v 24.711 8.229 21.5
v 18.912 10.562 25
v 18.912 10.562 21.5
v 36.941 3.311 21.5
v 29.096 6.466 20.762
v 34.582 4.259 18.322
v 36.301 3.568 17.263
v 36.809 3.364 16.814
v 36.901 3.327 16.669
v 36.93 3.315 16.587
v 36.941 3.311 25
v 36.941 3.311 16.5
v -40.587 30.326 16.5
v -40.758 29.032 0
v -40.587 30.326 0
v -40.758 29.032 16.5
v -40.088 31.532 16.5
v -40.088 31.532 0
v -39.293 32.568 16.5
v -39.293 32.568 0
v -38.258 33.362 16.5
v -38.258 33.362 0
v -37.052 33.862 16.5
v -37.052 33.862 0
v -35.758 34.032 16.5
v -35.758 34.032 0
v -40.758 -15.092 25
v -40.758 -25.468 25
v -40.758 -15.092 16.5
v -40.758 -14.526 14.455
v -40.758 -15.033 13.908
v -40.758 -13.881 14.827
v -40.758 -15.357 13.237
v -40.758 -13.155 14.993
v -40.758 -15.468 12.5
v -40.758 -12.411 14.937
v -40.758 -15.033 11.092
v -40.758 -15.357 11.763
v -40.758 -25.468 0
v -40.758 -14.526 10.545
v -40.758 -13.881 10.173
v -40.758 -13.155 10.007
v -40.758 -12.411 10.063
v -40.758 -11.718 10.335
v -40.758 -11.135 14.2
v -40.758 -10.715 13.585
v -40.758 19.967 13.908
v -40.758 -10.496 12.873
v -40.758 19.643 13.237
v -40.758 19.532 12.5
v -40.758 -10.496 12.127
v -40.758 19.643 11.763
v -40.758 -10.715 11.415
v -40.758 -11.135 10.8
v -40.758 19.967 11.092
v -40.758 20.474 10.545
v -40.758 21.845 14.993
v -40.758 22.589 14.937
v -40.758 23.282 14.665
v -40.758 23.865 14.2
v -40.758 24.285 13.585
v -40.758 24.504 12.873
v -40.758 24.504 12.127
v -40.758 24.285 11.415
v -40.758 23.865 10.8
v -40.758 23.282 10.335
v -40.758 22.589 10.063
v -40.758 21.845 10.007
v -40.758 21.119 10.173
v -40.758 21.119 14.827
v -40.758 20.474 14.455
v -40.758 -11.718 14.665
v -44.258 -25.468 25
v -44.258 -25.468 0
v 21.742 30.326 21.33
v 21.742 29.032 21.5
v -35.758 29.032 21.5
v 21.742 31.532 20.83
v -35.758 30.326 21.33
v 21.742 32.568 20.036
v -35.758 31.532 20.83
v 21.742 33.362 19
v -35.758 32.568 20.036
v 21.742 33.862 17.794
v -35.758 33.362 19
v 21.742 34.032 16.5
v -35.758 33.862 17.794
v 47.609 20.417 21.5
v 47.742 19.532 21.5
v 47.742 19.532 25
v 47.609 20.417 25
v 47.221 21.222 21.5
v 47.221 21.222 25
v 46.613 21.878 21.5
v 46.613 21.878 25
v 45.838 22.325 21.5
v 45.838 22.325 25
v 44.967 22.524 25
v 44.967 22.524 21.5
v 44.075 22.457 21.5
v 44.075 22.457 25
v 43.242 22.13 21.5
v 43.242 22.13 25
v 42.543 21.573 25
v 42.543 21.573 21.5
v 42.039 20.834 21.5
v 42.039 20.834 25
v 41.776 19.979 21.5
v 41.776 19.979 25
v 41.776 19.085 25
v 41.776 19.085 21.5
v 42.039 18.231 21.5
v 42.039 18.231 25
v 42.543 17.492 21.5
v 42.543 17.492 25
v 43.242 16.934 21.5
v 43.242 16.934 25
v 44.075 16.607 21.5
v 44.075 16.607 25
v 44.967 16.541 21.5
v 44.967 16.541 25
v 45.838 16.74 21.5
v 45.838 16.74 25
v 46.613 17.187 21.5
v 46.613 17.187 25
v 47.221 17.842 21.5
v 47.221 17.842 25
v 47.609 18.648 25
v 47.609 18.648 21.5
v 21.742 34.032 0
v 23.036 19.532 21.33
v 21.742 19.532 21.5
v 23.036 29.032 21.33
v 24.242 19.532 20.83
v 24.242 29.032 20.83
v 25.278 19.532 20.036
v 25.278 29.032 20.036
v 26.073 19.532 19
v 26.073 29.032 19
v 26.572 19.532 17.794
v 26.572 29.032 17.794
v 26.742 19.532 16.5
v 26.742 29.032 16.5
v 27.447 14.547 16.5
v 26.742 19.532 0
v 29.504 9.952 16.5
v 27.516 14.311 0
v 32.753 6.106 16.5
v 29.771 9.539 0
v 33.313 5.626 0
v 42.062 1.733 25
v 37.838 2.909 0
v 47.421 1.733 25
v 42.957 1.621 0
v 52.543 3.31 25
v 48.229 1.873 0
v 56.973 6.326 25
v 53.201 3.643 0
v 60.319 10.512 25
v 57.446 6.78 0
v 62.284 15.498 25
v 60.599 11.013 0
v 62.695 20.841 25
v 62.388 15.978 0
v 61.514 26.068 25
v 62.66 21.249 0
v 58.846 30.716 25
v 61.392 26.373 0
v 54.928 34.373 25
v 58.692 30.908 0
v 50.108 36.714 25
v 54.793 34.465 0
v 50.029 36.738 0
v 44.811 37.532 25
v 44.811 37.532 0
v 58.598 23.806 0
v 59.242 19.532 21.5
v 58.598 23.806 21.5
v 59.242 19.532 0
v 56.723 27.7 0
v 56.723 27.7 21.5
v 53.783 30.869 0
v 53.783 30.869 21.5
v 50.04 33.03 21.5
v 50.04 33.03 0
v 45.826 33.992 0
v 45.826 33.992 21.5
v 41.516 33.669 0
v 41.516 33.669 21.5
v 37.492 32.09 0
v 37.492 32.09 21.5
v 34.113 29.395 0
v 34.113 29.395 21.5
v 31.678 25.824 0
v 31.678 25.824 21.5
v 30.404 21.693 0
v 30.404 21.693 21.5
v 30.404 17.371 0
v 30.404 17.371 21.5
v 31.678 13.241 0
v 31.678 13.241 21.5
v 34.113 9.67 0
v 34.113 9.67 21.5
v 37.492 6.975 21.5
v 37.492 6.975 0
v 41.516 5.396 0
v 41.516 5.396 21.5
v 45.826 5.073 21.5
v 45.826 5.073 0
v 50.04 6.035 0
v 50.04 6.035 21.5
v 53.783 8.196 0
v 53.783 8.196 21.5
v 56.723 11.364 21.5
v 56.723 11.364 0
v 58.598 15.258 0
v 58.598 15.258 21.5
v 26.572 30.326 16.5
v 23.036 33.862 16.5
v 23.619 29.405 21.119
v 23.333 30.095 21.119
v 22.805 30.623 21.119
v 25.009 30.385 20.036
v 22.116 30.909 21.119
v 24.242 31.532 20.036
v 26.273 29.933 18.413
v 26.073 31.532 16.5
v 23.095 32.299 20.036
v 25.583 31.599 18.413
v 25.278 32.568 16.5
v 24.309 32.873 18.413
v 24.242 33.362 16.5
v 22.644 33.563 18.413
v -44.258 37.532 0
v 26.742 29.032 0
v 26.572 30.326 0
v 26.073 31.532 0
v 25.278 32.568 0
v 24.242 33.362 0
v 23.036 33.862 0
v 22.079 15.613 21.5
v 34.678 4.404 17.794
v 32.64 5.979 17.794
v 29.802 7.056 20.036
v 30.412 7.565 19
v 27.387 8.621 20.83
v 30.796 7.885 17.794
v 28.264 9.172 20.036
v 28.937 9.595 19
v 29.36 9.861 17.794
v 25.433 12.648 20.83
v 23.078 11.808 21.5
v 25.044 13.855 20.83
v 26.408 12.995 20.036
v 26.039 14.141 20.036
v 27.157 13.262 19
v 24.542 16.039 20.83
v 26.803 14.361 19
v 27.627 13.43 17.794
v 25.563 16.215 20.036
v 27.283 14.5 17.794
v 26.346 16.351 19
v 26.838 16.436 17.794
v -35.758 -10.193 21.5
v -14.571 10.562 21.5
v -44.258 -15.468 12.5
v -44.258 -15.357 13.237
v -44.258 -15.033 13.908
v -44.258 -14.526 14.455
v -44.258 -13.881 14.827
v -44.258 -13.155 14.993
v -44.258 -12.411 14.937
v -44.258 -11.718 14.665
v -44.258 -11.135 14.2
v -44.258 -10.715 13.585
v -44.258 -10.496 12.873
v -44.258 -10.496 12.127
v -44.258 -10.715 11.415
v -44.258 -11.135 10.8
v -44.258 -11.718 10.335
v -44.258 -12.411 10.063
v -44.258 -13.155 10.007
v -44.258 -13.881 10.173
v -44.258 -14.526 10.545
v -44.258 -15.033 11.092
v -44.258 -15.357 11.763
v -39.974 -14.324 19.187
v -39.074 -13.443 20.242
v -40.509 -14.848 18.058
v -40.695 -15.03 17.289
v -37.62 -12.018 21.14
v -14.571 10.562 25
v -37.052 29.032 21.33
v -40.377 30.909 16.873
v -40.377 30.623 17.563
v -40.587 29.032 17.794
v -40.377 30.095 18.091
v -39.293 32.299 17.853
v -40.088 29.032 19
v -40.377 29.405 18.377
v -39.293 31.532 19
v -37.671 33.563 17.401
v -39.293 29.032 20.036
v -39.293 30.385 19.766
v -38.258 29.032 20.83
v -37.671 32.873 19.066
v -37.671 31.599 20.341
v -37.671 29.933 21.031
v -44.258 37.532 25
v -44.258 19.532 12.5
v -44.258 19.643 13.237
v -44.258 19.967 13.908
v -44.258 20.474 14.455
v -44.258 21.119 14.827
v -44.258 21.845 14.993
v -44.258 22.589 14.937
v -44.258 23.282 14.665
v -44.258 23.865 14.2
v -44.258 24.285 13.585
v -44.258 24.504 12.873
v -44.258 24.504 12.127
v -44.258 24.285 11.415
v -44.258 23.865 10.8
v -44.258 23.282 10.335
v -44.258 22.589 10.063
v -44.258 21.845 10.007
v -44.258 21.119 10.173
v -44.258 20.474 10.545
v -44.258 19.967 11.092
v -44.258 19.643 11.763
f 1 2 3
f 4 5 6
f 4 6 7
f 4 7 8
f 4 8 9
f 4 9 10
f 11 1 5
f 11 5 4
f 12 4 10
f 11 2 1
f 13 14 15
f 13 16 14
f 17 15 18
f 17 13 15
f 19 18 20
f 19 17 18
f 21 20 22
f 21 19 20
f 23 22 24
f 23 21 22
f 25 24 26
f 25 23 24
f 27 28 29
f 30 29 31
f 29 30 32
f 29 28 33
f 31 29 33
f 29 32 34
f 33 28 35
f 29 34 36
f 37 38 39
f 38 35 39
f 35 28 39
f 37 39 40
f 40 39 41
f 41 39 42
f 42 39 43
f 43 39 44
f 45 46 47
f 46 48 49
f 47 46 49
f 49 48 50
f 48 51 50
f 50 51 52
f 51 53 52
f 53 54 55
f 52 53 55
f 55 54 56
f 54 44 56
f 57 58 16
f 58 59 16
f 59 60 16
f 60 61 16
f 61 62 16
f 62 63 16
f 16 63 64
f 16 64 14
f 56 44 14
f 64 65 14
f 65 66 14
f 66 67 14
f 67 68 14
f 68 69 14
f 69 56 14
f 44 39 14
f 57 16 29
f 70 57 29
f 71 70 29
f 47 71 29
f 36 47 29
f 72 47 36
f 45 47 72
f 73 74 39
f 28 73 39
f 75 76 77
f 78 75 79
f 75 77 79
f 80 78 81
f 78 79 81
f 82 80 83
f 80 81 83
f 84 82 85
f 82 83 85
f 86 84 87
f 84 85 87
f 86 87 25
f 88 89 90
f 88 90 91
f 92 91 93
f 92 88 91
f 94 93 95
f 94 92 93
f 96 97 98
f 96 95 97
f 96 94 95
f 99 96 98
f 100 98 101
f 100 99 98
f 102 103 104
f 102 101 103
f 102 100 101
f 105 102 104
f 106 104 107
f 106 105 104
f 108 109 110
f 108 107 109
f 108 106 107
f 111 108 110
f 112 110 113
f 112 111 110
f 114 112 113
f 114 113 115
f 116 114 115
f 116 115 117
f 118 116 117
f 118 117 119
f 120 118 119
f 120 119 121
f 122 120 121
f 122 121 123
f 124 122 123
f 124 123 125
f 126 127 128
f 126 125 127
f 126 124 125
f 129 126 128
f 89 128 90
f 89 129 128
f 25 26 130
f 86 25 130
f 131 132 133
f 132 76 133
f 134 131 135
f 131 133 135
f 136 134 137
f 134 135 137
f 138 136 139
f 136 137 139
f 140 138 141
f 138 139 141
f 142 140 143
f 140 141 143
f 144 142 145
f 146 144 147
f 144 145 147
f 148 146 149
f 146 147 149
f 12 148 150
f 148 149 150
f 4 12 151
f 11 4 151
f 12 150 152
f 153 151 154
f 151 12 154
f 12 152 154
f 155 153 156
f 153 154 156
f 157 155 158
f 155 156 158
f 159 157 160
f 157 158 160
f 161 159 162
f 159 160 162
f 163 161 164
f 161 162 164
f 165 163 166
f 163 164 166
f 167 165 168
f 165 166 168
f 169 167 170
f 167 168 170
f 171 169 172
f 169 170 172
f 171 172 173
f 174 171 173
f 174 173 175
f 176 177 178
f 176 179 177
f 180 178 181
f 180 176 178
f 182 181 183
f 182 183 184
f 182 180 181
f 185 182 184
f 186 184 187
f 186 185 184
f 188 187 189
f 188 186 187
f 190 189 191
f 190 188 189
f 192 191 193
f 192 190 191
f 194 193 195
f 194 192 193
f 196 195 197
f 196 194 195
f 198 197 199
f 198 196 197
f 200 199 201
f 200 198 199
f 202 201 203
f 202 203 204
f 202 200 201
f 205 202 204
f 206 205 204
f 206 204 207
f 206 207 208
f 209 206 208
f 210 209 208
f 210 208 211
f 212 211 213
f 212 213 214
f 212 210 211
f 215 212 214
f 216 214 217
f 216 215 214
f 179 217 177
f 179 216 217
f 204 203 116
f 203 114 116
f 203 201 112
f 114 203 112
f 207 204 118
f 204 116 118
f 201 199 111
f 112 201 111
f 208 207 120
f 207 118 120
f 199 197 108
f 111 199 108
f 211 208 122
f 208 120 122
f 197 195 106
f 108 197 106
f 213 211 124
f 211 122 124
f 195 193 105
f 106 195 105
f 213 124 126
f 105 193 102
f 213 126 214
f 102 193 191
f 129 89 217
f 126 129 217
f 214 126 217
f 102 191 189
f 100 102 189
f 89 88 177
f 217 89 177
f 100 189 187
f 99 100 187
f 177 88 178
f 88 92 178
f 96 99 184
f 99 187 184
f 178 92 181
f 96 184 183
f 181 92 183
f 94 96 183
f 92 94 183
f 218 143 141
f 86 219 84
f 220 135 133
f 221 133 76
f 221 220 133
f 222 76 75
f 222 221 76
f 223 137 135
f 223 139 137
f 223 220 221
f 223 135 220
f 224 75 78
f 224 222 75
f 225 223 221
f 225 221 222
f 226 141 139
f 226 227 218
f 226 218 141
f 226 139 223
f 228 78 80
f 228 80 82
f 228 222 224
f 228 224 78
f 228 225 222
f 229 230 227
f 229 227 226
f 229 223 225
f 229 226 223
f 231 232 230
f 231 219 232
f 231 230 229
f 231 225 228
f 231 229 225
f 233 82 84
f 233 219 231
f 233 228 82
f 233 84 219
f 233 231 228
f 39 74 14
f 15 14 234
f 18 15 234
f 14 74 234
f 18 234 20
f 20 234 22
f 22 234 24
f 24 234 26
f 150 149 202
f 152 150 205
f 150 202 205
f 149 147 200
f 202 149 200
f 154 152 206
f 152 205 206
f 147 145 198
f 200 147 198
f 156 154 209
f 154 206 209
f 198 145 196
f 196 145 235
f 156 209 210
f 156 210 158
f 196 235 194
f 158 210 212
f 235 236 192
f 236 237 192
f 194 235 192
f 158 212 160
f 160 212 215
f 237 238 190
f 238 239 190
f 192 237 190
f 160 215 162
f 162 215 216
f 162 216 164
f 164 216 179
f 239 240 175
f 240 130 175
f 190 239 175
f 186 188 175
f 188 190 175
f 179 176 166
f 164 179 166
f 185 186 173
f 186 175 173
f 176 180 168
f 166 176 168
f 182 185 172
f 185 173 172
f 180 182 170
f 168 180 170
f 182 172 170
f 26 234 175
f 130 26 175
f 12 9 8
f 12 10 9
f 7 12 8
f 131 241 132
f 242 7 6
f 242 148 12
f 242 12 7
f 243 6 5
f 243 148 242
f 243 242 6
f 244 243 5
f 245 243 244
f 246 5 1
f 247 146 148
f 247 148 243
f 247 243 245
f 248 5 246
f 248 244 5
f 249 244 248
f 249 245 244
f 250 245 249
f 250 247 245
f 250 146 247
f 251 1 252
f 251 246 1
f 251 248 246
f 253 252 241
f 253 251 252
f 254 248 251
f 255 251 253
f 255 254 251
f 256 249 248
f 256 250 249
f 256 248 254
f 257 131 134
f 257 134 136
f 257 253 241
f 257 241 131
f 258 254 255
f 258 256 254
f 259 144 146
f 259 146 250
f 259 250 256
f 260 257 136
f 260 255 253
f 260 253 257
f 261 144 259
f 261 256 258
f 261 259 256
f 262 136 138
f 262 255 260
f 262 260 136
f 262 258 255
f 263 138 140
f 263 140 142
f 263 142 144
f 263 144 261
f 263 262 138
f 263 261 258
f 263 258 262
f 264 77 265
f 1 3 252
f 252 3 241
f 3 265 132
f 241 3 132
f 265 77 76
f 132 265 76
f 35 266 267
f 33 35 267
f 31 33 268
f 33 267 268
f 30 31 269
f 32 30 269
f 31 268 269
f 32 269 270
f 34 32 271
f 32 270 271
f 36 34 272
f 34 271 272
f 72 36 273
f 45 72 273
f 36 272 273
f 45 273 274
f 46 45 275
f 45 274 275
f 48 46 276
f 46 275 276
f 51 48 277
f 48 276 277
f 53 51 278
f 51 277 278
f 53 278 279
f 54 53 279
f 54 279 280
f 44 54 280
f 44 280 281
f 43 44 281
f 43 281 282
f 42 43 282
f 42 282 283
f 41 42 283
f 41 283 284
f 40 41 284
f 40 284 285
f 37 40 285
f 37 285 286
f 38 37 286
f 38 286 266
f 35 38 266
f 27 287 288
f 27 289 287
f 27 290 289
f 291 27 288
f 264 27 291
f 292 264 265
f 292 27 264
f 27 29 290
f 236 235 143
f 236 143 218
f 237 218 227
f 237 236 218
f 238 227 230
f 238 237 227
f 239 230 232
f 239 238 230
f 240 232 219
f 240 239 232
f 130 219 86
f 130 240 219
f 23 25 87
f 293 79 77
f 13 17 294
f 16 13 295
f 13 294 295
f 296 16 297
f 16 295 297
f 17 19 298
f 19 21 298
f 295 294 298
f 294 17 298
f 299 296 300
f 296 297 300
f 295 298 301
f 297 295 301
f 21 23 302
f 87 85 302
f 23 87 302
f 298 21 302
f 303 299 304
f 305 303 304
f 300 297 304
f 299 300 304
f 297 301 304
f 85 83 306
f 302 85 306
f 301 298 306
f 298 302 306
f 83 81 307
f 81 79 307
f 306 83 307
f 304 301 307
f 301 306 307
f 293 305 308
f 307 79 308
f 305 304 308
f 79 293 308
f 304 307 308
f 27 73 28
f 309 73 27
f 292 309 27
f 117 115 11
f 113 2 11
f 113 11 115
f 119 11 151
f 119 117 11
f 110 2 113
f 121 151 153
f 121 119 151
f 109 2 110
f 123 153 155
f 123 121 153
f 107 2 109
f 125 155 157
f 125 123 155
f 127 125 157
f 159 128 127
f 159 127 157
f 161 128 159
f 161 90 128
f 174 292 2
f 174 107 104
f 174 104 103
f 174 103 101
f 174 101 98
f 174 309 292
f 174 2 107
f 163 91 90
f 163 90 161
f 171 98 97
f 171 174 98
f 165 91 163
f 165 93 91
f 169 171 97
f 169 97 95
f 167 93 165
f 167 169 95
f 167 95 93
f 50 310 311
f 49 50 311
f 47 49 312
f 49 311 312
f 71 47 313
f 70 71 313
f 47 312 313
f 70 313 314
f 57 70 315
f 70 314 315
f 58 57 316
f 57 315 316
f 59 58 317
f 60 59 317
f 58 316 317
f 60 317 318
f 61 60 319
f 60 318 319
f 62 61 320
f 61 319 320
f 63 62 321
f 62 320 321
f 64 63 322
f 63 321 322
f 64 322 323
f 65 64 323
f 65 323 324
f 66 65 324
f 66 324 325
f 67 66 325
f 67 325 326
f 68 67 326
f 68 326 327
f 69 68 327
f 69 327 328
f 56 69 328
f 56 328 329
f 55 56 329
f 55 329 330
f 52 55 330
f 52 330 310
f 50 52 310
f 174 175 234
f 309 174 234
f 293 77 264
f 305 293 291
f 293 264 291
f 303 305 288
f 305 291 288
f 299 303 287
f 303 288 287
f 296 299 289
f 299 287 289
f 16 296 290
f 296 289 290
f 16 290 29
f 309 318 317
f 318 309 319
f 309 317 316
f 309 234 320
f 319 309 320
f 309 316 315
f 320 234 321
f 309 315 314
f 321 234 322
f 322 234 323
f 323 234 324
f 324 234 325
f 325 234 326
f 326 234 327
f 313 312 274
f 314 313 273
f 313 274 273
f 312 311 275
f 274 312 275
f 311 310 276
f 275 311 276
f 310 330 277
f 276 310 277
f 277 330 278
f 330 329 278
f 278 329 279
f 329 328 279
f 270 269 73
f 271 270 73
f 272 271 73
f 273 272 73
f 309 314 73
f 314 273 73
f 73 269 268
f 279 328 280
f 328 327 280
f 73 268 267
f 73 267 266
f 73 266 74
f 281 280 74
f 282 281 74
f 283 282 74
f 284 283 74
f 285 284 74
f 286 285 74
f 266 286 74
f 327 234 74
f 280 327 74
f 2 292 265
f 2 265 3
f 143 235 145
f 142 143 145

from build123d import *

# Parameters (mm, degrees)
F0_R      = 14.5
F1_DEPTH  = 25
F2_R      = 14.5
F3_DEPTH  = 3
F4_R      = 2.5
F5_DEPTH  = 25
F0_R_2    = 3
F6_DEPTH  = 30
F8_DEPTH  = 25
F9_DEPTH  = 3.5
F10_DEPTH = 30
F11_R     = 5


# Not quite as in the source:
# - a feature names something its author has since deleted; it is built from what else it names


with BuildPart() as f1:
    # F0 (on Top) → F1 (new body)
    with BuildSketch(Plane.XY):
        with BuildLine():
            Line((-44.2576195002, 24.5322410017), (-44.2576195002, -25.4677589983))
            Line((-44.2576195002, -25.4677589983), (-40.7576195002, -25.4677589983))
            Line((-40.7576195002, -25.4677589983), (-40.7576195002, 34.0321085225))
            Line((-40.7576195002, 34.0321085225), (26.7423804998, 34.0321085225))
            Line((26.7423804998, 34.0321085225), (26.7423804998, 19.5322410017))
            ThreePointArc((26.7423804998, 19.5322410017), (57.445862821, 6.7799260387), (44.8114401571, 37.5321085225))
            Line((44.8114401571, 37.5321085225), (44.6733208426, 37.5321085225))
            Line((44.6733208426, 37.5321085225), (-44.2576195002, 37.5321085225))
            Line((-44.2576195002, 37.5321085225), (-44.2576195002, 24.5322410017))
        make_face()
        with Locations((44.7423804998, 19.5322410017)):
            Circle(F0_R, mode=Mode.SUBTRACT)
    extrude(amount=F1_DEPTH)

    # F2 (on face) → F3 (join)
    with BuildSketch(Plane.XY.offset(25)):
        with BuildLine():
            ThreePointArc((26.7423804998, 19.5322410017), (29.5038185973, 9.9517279079), (36.9408506267, 3.3107696863))
            ThreePointArc((36.9408506267, 3.3107696863), (62.2844095115, 15.4977375434), (44.8114401571, 37.5321085225))
            Line((44.8114401571, 37.5321085225), (-44.2576195002, 37.5321085225))
            Line((-44.2576195002, 37.5321085225), (-44.2576195002, -25.4677589983))
            Line((-44.2576195002, -25.4677589983), (-40.7576195002, -25.4677589983))
            Line((-40.7576195002, -25.4677589983), (-40.7576195002, -15.0916781276))
            Line((-40.7576195002, -15.0916781276), (-40.7576195002, 34.0321085225))
            Line((-40.7576195002, 34.0321085225), (26.7423804998, 34.0321085225))
            Line((26.7423804998, 34.0321085225), (26.7423804998, 19.5322410017))
        make_face()
        with Locations((44.7423804998, 19.5322410017)):
            Circle(F2_R, mode=Mode.SUBTRACT)
    extrude(amount=-F3_DEPTH)

    # F4 (on face) → F5 (cut)
    with BuildSketch(Plane(origin=(-44.2576195002, 0, 0), x_dir=(0, -1, 0), z_dir=(-1, 0, 0))):
        with Locations((12.9677589983, 12.5)):
            Circle(F4_R)
    extrude(amount=-F5_DEPTH, mode=Mode.SUBTRACT)

    # F0 (on Top) → F6 (cut)
    with BuildSketch(Plane.XY):
        with Locations((44.7423804998, 19.5322410017)):
            Circle(F0_R_2)
    extrude(amount=F6_DEPTH, mode=Mode.SUBTRACT)

    # F4 (on face) → F8 (cut)
    with BuildSketch(Plane(origin=(-44.2576195002, 0, 0), x_dir=(0, -1, 0), z_dir=(-1, 0, 0))):
        with Locations((-22.0322410017, 12.5)):
            Circle(F4_R)
    extrude(amount=-F8_DEPTH, mode=Mode.SUBTRACT)

    # F2 (on face) → F9 (join)
    with BuildSketch(Plane.XY.offset(25)):
        with BuildLine():
            Line((18.9116307646, 10.5619383976), (36.9408506267, 3.3107696863))
            ThreePointArc((36.9408506267, 3.3107696863), (29.5038185973, 9.9517279079), (26.7423804998, 19.5322410017))
            Line((26.7423804998, 19.5322410017), (26.7423804998, 34.0321085225))
            Line((26.7423804998, 34.0321085225), (-40.7576195002, 34.0321085225))
            Line((-40.7576195002, 34.0321085225), (-40.7576195002, -15.0916781276))
            Line((-40.7576195002, -15.0916781276), (-14.5708816946, 10.5619383976))
            Line((-14.5708816946, 10.5619383976), (18.9116307646, 10.5619383976))
        make_face()
        with Locations((44.7423804998, 19.5322410017)):
            Circle(F2_R)
    extrude(amount=-F9_DEPTH)

    # F0 (on Top) → F10 (cut)
    with BuildSketch(Plane.XY):
        with Locations((44.7423804998, 19.5322410017)):
            Circle(F0_R_2)
    extrude(amount=F10_DEPTH, mode=Mode.SUBTRACT)

    # F11
    f11_edges = [f1.edges().sort_by_distance(p)[0] for p in [
        (26.74238, 34.032109, 10.75),
        (26.74238, 26.782175, 21.5),
        (-7.00762, 34.032109, 21.5),
        (-40.75762, 34.032109, 10.75),
        (-40.75762, 9.470215, 21.5),
    ]]
    fillet(f11_edges, radius=F11_R)


solid = f1.part
